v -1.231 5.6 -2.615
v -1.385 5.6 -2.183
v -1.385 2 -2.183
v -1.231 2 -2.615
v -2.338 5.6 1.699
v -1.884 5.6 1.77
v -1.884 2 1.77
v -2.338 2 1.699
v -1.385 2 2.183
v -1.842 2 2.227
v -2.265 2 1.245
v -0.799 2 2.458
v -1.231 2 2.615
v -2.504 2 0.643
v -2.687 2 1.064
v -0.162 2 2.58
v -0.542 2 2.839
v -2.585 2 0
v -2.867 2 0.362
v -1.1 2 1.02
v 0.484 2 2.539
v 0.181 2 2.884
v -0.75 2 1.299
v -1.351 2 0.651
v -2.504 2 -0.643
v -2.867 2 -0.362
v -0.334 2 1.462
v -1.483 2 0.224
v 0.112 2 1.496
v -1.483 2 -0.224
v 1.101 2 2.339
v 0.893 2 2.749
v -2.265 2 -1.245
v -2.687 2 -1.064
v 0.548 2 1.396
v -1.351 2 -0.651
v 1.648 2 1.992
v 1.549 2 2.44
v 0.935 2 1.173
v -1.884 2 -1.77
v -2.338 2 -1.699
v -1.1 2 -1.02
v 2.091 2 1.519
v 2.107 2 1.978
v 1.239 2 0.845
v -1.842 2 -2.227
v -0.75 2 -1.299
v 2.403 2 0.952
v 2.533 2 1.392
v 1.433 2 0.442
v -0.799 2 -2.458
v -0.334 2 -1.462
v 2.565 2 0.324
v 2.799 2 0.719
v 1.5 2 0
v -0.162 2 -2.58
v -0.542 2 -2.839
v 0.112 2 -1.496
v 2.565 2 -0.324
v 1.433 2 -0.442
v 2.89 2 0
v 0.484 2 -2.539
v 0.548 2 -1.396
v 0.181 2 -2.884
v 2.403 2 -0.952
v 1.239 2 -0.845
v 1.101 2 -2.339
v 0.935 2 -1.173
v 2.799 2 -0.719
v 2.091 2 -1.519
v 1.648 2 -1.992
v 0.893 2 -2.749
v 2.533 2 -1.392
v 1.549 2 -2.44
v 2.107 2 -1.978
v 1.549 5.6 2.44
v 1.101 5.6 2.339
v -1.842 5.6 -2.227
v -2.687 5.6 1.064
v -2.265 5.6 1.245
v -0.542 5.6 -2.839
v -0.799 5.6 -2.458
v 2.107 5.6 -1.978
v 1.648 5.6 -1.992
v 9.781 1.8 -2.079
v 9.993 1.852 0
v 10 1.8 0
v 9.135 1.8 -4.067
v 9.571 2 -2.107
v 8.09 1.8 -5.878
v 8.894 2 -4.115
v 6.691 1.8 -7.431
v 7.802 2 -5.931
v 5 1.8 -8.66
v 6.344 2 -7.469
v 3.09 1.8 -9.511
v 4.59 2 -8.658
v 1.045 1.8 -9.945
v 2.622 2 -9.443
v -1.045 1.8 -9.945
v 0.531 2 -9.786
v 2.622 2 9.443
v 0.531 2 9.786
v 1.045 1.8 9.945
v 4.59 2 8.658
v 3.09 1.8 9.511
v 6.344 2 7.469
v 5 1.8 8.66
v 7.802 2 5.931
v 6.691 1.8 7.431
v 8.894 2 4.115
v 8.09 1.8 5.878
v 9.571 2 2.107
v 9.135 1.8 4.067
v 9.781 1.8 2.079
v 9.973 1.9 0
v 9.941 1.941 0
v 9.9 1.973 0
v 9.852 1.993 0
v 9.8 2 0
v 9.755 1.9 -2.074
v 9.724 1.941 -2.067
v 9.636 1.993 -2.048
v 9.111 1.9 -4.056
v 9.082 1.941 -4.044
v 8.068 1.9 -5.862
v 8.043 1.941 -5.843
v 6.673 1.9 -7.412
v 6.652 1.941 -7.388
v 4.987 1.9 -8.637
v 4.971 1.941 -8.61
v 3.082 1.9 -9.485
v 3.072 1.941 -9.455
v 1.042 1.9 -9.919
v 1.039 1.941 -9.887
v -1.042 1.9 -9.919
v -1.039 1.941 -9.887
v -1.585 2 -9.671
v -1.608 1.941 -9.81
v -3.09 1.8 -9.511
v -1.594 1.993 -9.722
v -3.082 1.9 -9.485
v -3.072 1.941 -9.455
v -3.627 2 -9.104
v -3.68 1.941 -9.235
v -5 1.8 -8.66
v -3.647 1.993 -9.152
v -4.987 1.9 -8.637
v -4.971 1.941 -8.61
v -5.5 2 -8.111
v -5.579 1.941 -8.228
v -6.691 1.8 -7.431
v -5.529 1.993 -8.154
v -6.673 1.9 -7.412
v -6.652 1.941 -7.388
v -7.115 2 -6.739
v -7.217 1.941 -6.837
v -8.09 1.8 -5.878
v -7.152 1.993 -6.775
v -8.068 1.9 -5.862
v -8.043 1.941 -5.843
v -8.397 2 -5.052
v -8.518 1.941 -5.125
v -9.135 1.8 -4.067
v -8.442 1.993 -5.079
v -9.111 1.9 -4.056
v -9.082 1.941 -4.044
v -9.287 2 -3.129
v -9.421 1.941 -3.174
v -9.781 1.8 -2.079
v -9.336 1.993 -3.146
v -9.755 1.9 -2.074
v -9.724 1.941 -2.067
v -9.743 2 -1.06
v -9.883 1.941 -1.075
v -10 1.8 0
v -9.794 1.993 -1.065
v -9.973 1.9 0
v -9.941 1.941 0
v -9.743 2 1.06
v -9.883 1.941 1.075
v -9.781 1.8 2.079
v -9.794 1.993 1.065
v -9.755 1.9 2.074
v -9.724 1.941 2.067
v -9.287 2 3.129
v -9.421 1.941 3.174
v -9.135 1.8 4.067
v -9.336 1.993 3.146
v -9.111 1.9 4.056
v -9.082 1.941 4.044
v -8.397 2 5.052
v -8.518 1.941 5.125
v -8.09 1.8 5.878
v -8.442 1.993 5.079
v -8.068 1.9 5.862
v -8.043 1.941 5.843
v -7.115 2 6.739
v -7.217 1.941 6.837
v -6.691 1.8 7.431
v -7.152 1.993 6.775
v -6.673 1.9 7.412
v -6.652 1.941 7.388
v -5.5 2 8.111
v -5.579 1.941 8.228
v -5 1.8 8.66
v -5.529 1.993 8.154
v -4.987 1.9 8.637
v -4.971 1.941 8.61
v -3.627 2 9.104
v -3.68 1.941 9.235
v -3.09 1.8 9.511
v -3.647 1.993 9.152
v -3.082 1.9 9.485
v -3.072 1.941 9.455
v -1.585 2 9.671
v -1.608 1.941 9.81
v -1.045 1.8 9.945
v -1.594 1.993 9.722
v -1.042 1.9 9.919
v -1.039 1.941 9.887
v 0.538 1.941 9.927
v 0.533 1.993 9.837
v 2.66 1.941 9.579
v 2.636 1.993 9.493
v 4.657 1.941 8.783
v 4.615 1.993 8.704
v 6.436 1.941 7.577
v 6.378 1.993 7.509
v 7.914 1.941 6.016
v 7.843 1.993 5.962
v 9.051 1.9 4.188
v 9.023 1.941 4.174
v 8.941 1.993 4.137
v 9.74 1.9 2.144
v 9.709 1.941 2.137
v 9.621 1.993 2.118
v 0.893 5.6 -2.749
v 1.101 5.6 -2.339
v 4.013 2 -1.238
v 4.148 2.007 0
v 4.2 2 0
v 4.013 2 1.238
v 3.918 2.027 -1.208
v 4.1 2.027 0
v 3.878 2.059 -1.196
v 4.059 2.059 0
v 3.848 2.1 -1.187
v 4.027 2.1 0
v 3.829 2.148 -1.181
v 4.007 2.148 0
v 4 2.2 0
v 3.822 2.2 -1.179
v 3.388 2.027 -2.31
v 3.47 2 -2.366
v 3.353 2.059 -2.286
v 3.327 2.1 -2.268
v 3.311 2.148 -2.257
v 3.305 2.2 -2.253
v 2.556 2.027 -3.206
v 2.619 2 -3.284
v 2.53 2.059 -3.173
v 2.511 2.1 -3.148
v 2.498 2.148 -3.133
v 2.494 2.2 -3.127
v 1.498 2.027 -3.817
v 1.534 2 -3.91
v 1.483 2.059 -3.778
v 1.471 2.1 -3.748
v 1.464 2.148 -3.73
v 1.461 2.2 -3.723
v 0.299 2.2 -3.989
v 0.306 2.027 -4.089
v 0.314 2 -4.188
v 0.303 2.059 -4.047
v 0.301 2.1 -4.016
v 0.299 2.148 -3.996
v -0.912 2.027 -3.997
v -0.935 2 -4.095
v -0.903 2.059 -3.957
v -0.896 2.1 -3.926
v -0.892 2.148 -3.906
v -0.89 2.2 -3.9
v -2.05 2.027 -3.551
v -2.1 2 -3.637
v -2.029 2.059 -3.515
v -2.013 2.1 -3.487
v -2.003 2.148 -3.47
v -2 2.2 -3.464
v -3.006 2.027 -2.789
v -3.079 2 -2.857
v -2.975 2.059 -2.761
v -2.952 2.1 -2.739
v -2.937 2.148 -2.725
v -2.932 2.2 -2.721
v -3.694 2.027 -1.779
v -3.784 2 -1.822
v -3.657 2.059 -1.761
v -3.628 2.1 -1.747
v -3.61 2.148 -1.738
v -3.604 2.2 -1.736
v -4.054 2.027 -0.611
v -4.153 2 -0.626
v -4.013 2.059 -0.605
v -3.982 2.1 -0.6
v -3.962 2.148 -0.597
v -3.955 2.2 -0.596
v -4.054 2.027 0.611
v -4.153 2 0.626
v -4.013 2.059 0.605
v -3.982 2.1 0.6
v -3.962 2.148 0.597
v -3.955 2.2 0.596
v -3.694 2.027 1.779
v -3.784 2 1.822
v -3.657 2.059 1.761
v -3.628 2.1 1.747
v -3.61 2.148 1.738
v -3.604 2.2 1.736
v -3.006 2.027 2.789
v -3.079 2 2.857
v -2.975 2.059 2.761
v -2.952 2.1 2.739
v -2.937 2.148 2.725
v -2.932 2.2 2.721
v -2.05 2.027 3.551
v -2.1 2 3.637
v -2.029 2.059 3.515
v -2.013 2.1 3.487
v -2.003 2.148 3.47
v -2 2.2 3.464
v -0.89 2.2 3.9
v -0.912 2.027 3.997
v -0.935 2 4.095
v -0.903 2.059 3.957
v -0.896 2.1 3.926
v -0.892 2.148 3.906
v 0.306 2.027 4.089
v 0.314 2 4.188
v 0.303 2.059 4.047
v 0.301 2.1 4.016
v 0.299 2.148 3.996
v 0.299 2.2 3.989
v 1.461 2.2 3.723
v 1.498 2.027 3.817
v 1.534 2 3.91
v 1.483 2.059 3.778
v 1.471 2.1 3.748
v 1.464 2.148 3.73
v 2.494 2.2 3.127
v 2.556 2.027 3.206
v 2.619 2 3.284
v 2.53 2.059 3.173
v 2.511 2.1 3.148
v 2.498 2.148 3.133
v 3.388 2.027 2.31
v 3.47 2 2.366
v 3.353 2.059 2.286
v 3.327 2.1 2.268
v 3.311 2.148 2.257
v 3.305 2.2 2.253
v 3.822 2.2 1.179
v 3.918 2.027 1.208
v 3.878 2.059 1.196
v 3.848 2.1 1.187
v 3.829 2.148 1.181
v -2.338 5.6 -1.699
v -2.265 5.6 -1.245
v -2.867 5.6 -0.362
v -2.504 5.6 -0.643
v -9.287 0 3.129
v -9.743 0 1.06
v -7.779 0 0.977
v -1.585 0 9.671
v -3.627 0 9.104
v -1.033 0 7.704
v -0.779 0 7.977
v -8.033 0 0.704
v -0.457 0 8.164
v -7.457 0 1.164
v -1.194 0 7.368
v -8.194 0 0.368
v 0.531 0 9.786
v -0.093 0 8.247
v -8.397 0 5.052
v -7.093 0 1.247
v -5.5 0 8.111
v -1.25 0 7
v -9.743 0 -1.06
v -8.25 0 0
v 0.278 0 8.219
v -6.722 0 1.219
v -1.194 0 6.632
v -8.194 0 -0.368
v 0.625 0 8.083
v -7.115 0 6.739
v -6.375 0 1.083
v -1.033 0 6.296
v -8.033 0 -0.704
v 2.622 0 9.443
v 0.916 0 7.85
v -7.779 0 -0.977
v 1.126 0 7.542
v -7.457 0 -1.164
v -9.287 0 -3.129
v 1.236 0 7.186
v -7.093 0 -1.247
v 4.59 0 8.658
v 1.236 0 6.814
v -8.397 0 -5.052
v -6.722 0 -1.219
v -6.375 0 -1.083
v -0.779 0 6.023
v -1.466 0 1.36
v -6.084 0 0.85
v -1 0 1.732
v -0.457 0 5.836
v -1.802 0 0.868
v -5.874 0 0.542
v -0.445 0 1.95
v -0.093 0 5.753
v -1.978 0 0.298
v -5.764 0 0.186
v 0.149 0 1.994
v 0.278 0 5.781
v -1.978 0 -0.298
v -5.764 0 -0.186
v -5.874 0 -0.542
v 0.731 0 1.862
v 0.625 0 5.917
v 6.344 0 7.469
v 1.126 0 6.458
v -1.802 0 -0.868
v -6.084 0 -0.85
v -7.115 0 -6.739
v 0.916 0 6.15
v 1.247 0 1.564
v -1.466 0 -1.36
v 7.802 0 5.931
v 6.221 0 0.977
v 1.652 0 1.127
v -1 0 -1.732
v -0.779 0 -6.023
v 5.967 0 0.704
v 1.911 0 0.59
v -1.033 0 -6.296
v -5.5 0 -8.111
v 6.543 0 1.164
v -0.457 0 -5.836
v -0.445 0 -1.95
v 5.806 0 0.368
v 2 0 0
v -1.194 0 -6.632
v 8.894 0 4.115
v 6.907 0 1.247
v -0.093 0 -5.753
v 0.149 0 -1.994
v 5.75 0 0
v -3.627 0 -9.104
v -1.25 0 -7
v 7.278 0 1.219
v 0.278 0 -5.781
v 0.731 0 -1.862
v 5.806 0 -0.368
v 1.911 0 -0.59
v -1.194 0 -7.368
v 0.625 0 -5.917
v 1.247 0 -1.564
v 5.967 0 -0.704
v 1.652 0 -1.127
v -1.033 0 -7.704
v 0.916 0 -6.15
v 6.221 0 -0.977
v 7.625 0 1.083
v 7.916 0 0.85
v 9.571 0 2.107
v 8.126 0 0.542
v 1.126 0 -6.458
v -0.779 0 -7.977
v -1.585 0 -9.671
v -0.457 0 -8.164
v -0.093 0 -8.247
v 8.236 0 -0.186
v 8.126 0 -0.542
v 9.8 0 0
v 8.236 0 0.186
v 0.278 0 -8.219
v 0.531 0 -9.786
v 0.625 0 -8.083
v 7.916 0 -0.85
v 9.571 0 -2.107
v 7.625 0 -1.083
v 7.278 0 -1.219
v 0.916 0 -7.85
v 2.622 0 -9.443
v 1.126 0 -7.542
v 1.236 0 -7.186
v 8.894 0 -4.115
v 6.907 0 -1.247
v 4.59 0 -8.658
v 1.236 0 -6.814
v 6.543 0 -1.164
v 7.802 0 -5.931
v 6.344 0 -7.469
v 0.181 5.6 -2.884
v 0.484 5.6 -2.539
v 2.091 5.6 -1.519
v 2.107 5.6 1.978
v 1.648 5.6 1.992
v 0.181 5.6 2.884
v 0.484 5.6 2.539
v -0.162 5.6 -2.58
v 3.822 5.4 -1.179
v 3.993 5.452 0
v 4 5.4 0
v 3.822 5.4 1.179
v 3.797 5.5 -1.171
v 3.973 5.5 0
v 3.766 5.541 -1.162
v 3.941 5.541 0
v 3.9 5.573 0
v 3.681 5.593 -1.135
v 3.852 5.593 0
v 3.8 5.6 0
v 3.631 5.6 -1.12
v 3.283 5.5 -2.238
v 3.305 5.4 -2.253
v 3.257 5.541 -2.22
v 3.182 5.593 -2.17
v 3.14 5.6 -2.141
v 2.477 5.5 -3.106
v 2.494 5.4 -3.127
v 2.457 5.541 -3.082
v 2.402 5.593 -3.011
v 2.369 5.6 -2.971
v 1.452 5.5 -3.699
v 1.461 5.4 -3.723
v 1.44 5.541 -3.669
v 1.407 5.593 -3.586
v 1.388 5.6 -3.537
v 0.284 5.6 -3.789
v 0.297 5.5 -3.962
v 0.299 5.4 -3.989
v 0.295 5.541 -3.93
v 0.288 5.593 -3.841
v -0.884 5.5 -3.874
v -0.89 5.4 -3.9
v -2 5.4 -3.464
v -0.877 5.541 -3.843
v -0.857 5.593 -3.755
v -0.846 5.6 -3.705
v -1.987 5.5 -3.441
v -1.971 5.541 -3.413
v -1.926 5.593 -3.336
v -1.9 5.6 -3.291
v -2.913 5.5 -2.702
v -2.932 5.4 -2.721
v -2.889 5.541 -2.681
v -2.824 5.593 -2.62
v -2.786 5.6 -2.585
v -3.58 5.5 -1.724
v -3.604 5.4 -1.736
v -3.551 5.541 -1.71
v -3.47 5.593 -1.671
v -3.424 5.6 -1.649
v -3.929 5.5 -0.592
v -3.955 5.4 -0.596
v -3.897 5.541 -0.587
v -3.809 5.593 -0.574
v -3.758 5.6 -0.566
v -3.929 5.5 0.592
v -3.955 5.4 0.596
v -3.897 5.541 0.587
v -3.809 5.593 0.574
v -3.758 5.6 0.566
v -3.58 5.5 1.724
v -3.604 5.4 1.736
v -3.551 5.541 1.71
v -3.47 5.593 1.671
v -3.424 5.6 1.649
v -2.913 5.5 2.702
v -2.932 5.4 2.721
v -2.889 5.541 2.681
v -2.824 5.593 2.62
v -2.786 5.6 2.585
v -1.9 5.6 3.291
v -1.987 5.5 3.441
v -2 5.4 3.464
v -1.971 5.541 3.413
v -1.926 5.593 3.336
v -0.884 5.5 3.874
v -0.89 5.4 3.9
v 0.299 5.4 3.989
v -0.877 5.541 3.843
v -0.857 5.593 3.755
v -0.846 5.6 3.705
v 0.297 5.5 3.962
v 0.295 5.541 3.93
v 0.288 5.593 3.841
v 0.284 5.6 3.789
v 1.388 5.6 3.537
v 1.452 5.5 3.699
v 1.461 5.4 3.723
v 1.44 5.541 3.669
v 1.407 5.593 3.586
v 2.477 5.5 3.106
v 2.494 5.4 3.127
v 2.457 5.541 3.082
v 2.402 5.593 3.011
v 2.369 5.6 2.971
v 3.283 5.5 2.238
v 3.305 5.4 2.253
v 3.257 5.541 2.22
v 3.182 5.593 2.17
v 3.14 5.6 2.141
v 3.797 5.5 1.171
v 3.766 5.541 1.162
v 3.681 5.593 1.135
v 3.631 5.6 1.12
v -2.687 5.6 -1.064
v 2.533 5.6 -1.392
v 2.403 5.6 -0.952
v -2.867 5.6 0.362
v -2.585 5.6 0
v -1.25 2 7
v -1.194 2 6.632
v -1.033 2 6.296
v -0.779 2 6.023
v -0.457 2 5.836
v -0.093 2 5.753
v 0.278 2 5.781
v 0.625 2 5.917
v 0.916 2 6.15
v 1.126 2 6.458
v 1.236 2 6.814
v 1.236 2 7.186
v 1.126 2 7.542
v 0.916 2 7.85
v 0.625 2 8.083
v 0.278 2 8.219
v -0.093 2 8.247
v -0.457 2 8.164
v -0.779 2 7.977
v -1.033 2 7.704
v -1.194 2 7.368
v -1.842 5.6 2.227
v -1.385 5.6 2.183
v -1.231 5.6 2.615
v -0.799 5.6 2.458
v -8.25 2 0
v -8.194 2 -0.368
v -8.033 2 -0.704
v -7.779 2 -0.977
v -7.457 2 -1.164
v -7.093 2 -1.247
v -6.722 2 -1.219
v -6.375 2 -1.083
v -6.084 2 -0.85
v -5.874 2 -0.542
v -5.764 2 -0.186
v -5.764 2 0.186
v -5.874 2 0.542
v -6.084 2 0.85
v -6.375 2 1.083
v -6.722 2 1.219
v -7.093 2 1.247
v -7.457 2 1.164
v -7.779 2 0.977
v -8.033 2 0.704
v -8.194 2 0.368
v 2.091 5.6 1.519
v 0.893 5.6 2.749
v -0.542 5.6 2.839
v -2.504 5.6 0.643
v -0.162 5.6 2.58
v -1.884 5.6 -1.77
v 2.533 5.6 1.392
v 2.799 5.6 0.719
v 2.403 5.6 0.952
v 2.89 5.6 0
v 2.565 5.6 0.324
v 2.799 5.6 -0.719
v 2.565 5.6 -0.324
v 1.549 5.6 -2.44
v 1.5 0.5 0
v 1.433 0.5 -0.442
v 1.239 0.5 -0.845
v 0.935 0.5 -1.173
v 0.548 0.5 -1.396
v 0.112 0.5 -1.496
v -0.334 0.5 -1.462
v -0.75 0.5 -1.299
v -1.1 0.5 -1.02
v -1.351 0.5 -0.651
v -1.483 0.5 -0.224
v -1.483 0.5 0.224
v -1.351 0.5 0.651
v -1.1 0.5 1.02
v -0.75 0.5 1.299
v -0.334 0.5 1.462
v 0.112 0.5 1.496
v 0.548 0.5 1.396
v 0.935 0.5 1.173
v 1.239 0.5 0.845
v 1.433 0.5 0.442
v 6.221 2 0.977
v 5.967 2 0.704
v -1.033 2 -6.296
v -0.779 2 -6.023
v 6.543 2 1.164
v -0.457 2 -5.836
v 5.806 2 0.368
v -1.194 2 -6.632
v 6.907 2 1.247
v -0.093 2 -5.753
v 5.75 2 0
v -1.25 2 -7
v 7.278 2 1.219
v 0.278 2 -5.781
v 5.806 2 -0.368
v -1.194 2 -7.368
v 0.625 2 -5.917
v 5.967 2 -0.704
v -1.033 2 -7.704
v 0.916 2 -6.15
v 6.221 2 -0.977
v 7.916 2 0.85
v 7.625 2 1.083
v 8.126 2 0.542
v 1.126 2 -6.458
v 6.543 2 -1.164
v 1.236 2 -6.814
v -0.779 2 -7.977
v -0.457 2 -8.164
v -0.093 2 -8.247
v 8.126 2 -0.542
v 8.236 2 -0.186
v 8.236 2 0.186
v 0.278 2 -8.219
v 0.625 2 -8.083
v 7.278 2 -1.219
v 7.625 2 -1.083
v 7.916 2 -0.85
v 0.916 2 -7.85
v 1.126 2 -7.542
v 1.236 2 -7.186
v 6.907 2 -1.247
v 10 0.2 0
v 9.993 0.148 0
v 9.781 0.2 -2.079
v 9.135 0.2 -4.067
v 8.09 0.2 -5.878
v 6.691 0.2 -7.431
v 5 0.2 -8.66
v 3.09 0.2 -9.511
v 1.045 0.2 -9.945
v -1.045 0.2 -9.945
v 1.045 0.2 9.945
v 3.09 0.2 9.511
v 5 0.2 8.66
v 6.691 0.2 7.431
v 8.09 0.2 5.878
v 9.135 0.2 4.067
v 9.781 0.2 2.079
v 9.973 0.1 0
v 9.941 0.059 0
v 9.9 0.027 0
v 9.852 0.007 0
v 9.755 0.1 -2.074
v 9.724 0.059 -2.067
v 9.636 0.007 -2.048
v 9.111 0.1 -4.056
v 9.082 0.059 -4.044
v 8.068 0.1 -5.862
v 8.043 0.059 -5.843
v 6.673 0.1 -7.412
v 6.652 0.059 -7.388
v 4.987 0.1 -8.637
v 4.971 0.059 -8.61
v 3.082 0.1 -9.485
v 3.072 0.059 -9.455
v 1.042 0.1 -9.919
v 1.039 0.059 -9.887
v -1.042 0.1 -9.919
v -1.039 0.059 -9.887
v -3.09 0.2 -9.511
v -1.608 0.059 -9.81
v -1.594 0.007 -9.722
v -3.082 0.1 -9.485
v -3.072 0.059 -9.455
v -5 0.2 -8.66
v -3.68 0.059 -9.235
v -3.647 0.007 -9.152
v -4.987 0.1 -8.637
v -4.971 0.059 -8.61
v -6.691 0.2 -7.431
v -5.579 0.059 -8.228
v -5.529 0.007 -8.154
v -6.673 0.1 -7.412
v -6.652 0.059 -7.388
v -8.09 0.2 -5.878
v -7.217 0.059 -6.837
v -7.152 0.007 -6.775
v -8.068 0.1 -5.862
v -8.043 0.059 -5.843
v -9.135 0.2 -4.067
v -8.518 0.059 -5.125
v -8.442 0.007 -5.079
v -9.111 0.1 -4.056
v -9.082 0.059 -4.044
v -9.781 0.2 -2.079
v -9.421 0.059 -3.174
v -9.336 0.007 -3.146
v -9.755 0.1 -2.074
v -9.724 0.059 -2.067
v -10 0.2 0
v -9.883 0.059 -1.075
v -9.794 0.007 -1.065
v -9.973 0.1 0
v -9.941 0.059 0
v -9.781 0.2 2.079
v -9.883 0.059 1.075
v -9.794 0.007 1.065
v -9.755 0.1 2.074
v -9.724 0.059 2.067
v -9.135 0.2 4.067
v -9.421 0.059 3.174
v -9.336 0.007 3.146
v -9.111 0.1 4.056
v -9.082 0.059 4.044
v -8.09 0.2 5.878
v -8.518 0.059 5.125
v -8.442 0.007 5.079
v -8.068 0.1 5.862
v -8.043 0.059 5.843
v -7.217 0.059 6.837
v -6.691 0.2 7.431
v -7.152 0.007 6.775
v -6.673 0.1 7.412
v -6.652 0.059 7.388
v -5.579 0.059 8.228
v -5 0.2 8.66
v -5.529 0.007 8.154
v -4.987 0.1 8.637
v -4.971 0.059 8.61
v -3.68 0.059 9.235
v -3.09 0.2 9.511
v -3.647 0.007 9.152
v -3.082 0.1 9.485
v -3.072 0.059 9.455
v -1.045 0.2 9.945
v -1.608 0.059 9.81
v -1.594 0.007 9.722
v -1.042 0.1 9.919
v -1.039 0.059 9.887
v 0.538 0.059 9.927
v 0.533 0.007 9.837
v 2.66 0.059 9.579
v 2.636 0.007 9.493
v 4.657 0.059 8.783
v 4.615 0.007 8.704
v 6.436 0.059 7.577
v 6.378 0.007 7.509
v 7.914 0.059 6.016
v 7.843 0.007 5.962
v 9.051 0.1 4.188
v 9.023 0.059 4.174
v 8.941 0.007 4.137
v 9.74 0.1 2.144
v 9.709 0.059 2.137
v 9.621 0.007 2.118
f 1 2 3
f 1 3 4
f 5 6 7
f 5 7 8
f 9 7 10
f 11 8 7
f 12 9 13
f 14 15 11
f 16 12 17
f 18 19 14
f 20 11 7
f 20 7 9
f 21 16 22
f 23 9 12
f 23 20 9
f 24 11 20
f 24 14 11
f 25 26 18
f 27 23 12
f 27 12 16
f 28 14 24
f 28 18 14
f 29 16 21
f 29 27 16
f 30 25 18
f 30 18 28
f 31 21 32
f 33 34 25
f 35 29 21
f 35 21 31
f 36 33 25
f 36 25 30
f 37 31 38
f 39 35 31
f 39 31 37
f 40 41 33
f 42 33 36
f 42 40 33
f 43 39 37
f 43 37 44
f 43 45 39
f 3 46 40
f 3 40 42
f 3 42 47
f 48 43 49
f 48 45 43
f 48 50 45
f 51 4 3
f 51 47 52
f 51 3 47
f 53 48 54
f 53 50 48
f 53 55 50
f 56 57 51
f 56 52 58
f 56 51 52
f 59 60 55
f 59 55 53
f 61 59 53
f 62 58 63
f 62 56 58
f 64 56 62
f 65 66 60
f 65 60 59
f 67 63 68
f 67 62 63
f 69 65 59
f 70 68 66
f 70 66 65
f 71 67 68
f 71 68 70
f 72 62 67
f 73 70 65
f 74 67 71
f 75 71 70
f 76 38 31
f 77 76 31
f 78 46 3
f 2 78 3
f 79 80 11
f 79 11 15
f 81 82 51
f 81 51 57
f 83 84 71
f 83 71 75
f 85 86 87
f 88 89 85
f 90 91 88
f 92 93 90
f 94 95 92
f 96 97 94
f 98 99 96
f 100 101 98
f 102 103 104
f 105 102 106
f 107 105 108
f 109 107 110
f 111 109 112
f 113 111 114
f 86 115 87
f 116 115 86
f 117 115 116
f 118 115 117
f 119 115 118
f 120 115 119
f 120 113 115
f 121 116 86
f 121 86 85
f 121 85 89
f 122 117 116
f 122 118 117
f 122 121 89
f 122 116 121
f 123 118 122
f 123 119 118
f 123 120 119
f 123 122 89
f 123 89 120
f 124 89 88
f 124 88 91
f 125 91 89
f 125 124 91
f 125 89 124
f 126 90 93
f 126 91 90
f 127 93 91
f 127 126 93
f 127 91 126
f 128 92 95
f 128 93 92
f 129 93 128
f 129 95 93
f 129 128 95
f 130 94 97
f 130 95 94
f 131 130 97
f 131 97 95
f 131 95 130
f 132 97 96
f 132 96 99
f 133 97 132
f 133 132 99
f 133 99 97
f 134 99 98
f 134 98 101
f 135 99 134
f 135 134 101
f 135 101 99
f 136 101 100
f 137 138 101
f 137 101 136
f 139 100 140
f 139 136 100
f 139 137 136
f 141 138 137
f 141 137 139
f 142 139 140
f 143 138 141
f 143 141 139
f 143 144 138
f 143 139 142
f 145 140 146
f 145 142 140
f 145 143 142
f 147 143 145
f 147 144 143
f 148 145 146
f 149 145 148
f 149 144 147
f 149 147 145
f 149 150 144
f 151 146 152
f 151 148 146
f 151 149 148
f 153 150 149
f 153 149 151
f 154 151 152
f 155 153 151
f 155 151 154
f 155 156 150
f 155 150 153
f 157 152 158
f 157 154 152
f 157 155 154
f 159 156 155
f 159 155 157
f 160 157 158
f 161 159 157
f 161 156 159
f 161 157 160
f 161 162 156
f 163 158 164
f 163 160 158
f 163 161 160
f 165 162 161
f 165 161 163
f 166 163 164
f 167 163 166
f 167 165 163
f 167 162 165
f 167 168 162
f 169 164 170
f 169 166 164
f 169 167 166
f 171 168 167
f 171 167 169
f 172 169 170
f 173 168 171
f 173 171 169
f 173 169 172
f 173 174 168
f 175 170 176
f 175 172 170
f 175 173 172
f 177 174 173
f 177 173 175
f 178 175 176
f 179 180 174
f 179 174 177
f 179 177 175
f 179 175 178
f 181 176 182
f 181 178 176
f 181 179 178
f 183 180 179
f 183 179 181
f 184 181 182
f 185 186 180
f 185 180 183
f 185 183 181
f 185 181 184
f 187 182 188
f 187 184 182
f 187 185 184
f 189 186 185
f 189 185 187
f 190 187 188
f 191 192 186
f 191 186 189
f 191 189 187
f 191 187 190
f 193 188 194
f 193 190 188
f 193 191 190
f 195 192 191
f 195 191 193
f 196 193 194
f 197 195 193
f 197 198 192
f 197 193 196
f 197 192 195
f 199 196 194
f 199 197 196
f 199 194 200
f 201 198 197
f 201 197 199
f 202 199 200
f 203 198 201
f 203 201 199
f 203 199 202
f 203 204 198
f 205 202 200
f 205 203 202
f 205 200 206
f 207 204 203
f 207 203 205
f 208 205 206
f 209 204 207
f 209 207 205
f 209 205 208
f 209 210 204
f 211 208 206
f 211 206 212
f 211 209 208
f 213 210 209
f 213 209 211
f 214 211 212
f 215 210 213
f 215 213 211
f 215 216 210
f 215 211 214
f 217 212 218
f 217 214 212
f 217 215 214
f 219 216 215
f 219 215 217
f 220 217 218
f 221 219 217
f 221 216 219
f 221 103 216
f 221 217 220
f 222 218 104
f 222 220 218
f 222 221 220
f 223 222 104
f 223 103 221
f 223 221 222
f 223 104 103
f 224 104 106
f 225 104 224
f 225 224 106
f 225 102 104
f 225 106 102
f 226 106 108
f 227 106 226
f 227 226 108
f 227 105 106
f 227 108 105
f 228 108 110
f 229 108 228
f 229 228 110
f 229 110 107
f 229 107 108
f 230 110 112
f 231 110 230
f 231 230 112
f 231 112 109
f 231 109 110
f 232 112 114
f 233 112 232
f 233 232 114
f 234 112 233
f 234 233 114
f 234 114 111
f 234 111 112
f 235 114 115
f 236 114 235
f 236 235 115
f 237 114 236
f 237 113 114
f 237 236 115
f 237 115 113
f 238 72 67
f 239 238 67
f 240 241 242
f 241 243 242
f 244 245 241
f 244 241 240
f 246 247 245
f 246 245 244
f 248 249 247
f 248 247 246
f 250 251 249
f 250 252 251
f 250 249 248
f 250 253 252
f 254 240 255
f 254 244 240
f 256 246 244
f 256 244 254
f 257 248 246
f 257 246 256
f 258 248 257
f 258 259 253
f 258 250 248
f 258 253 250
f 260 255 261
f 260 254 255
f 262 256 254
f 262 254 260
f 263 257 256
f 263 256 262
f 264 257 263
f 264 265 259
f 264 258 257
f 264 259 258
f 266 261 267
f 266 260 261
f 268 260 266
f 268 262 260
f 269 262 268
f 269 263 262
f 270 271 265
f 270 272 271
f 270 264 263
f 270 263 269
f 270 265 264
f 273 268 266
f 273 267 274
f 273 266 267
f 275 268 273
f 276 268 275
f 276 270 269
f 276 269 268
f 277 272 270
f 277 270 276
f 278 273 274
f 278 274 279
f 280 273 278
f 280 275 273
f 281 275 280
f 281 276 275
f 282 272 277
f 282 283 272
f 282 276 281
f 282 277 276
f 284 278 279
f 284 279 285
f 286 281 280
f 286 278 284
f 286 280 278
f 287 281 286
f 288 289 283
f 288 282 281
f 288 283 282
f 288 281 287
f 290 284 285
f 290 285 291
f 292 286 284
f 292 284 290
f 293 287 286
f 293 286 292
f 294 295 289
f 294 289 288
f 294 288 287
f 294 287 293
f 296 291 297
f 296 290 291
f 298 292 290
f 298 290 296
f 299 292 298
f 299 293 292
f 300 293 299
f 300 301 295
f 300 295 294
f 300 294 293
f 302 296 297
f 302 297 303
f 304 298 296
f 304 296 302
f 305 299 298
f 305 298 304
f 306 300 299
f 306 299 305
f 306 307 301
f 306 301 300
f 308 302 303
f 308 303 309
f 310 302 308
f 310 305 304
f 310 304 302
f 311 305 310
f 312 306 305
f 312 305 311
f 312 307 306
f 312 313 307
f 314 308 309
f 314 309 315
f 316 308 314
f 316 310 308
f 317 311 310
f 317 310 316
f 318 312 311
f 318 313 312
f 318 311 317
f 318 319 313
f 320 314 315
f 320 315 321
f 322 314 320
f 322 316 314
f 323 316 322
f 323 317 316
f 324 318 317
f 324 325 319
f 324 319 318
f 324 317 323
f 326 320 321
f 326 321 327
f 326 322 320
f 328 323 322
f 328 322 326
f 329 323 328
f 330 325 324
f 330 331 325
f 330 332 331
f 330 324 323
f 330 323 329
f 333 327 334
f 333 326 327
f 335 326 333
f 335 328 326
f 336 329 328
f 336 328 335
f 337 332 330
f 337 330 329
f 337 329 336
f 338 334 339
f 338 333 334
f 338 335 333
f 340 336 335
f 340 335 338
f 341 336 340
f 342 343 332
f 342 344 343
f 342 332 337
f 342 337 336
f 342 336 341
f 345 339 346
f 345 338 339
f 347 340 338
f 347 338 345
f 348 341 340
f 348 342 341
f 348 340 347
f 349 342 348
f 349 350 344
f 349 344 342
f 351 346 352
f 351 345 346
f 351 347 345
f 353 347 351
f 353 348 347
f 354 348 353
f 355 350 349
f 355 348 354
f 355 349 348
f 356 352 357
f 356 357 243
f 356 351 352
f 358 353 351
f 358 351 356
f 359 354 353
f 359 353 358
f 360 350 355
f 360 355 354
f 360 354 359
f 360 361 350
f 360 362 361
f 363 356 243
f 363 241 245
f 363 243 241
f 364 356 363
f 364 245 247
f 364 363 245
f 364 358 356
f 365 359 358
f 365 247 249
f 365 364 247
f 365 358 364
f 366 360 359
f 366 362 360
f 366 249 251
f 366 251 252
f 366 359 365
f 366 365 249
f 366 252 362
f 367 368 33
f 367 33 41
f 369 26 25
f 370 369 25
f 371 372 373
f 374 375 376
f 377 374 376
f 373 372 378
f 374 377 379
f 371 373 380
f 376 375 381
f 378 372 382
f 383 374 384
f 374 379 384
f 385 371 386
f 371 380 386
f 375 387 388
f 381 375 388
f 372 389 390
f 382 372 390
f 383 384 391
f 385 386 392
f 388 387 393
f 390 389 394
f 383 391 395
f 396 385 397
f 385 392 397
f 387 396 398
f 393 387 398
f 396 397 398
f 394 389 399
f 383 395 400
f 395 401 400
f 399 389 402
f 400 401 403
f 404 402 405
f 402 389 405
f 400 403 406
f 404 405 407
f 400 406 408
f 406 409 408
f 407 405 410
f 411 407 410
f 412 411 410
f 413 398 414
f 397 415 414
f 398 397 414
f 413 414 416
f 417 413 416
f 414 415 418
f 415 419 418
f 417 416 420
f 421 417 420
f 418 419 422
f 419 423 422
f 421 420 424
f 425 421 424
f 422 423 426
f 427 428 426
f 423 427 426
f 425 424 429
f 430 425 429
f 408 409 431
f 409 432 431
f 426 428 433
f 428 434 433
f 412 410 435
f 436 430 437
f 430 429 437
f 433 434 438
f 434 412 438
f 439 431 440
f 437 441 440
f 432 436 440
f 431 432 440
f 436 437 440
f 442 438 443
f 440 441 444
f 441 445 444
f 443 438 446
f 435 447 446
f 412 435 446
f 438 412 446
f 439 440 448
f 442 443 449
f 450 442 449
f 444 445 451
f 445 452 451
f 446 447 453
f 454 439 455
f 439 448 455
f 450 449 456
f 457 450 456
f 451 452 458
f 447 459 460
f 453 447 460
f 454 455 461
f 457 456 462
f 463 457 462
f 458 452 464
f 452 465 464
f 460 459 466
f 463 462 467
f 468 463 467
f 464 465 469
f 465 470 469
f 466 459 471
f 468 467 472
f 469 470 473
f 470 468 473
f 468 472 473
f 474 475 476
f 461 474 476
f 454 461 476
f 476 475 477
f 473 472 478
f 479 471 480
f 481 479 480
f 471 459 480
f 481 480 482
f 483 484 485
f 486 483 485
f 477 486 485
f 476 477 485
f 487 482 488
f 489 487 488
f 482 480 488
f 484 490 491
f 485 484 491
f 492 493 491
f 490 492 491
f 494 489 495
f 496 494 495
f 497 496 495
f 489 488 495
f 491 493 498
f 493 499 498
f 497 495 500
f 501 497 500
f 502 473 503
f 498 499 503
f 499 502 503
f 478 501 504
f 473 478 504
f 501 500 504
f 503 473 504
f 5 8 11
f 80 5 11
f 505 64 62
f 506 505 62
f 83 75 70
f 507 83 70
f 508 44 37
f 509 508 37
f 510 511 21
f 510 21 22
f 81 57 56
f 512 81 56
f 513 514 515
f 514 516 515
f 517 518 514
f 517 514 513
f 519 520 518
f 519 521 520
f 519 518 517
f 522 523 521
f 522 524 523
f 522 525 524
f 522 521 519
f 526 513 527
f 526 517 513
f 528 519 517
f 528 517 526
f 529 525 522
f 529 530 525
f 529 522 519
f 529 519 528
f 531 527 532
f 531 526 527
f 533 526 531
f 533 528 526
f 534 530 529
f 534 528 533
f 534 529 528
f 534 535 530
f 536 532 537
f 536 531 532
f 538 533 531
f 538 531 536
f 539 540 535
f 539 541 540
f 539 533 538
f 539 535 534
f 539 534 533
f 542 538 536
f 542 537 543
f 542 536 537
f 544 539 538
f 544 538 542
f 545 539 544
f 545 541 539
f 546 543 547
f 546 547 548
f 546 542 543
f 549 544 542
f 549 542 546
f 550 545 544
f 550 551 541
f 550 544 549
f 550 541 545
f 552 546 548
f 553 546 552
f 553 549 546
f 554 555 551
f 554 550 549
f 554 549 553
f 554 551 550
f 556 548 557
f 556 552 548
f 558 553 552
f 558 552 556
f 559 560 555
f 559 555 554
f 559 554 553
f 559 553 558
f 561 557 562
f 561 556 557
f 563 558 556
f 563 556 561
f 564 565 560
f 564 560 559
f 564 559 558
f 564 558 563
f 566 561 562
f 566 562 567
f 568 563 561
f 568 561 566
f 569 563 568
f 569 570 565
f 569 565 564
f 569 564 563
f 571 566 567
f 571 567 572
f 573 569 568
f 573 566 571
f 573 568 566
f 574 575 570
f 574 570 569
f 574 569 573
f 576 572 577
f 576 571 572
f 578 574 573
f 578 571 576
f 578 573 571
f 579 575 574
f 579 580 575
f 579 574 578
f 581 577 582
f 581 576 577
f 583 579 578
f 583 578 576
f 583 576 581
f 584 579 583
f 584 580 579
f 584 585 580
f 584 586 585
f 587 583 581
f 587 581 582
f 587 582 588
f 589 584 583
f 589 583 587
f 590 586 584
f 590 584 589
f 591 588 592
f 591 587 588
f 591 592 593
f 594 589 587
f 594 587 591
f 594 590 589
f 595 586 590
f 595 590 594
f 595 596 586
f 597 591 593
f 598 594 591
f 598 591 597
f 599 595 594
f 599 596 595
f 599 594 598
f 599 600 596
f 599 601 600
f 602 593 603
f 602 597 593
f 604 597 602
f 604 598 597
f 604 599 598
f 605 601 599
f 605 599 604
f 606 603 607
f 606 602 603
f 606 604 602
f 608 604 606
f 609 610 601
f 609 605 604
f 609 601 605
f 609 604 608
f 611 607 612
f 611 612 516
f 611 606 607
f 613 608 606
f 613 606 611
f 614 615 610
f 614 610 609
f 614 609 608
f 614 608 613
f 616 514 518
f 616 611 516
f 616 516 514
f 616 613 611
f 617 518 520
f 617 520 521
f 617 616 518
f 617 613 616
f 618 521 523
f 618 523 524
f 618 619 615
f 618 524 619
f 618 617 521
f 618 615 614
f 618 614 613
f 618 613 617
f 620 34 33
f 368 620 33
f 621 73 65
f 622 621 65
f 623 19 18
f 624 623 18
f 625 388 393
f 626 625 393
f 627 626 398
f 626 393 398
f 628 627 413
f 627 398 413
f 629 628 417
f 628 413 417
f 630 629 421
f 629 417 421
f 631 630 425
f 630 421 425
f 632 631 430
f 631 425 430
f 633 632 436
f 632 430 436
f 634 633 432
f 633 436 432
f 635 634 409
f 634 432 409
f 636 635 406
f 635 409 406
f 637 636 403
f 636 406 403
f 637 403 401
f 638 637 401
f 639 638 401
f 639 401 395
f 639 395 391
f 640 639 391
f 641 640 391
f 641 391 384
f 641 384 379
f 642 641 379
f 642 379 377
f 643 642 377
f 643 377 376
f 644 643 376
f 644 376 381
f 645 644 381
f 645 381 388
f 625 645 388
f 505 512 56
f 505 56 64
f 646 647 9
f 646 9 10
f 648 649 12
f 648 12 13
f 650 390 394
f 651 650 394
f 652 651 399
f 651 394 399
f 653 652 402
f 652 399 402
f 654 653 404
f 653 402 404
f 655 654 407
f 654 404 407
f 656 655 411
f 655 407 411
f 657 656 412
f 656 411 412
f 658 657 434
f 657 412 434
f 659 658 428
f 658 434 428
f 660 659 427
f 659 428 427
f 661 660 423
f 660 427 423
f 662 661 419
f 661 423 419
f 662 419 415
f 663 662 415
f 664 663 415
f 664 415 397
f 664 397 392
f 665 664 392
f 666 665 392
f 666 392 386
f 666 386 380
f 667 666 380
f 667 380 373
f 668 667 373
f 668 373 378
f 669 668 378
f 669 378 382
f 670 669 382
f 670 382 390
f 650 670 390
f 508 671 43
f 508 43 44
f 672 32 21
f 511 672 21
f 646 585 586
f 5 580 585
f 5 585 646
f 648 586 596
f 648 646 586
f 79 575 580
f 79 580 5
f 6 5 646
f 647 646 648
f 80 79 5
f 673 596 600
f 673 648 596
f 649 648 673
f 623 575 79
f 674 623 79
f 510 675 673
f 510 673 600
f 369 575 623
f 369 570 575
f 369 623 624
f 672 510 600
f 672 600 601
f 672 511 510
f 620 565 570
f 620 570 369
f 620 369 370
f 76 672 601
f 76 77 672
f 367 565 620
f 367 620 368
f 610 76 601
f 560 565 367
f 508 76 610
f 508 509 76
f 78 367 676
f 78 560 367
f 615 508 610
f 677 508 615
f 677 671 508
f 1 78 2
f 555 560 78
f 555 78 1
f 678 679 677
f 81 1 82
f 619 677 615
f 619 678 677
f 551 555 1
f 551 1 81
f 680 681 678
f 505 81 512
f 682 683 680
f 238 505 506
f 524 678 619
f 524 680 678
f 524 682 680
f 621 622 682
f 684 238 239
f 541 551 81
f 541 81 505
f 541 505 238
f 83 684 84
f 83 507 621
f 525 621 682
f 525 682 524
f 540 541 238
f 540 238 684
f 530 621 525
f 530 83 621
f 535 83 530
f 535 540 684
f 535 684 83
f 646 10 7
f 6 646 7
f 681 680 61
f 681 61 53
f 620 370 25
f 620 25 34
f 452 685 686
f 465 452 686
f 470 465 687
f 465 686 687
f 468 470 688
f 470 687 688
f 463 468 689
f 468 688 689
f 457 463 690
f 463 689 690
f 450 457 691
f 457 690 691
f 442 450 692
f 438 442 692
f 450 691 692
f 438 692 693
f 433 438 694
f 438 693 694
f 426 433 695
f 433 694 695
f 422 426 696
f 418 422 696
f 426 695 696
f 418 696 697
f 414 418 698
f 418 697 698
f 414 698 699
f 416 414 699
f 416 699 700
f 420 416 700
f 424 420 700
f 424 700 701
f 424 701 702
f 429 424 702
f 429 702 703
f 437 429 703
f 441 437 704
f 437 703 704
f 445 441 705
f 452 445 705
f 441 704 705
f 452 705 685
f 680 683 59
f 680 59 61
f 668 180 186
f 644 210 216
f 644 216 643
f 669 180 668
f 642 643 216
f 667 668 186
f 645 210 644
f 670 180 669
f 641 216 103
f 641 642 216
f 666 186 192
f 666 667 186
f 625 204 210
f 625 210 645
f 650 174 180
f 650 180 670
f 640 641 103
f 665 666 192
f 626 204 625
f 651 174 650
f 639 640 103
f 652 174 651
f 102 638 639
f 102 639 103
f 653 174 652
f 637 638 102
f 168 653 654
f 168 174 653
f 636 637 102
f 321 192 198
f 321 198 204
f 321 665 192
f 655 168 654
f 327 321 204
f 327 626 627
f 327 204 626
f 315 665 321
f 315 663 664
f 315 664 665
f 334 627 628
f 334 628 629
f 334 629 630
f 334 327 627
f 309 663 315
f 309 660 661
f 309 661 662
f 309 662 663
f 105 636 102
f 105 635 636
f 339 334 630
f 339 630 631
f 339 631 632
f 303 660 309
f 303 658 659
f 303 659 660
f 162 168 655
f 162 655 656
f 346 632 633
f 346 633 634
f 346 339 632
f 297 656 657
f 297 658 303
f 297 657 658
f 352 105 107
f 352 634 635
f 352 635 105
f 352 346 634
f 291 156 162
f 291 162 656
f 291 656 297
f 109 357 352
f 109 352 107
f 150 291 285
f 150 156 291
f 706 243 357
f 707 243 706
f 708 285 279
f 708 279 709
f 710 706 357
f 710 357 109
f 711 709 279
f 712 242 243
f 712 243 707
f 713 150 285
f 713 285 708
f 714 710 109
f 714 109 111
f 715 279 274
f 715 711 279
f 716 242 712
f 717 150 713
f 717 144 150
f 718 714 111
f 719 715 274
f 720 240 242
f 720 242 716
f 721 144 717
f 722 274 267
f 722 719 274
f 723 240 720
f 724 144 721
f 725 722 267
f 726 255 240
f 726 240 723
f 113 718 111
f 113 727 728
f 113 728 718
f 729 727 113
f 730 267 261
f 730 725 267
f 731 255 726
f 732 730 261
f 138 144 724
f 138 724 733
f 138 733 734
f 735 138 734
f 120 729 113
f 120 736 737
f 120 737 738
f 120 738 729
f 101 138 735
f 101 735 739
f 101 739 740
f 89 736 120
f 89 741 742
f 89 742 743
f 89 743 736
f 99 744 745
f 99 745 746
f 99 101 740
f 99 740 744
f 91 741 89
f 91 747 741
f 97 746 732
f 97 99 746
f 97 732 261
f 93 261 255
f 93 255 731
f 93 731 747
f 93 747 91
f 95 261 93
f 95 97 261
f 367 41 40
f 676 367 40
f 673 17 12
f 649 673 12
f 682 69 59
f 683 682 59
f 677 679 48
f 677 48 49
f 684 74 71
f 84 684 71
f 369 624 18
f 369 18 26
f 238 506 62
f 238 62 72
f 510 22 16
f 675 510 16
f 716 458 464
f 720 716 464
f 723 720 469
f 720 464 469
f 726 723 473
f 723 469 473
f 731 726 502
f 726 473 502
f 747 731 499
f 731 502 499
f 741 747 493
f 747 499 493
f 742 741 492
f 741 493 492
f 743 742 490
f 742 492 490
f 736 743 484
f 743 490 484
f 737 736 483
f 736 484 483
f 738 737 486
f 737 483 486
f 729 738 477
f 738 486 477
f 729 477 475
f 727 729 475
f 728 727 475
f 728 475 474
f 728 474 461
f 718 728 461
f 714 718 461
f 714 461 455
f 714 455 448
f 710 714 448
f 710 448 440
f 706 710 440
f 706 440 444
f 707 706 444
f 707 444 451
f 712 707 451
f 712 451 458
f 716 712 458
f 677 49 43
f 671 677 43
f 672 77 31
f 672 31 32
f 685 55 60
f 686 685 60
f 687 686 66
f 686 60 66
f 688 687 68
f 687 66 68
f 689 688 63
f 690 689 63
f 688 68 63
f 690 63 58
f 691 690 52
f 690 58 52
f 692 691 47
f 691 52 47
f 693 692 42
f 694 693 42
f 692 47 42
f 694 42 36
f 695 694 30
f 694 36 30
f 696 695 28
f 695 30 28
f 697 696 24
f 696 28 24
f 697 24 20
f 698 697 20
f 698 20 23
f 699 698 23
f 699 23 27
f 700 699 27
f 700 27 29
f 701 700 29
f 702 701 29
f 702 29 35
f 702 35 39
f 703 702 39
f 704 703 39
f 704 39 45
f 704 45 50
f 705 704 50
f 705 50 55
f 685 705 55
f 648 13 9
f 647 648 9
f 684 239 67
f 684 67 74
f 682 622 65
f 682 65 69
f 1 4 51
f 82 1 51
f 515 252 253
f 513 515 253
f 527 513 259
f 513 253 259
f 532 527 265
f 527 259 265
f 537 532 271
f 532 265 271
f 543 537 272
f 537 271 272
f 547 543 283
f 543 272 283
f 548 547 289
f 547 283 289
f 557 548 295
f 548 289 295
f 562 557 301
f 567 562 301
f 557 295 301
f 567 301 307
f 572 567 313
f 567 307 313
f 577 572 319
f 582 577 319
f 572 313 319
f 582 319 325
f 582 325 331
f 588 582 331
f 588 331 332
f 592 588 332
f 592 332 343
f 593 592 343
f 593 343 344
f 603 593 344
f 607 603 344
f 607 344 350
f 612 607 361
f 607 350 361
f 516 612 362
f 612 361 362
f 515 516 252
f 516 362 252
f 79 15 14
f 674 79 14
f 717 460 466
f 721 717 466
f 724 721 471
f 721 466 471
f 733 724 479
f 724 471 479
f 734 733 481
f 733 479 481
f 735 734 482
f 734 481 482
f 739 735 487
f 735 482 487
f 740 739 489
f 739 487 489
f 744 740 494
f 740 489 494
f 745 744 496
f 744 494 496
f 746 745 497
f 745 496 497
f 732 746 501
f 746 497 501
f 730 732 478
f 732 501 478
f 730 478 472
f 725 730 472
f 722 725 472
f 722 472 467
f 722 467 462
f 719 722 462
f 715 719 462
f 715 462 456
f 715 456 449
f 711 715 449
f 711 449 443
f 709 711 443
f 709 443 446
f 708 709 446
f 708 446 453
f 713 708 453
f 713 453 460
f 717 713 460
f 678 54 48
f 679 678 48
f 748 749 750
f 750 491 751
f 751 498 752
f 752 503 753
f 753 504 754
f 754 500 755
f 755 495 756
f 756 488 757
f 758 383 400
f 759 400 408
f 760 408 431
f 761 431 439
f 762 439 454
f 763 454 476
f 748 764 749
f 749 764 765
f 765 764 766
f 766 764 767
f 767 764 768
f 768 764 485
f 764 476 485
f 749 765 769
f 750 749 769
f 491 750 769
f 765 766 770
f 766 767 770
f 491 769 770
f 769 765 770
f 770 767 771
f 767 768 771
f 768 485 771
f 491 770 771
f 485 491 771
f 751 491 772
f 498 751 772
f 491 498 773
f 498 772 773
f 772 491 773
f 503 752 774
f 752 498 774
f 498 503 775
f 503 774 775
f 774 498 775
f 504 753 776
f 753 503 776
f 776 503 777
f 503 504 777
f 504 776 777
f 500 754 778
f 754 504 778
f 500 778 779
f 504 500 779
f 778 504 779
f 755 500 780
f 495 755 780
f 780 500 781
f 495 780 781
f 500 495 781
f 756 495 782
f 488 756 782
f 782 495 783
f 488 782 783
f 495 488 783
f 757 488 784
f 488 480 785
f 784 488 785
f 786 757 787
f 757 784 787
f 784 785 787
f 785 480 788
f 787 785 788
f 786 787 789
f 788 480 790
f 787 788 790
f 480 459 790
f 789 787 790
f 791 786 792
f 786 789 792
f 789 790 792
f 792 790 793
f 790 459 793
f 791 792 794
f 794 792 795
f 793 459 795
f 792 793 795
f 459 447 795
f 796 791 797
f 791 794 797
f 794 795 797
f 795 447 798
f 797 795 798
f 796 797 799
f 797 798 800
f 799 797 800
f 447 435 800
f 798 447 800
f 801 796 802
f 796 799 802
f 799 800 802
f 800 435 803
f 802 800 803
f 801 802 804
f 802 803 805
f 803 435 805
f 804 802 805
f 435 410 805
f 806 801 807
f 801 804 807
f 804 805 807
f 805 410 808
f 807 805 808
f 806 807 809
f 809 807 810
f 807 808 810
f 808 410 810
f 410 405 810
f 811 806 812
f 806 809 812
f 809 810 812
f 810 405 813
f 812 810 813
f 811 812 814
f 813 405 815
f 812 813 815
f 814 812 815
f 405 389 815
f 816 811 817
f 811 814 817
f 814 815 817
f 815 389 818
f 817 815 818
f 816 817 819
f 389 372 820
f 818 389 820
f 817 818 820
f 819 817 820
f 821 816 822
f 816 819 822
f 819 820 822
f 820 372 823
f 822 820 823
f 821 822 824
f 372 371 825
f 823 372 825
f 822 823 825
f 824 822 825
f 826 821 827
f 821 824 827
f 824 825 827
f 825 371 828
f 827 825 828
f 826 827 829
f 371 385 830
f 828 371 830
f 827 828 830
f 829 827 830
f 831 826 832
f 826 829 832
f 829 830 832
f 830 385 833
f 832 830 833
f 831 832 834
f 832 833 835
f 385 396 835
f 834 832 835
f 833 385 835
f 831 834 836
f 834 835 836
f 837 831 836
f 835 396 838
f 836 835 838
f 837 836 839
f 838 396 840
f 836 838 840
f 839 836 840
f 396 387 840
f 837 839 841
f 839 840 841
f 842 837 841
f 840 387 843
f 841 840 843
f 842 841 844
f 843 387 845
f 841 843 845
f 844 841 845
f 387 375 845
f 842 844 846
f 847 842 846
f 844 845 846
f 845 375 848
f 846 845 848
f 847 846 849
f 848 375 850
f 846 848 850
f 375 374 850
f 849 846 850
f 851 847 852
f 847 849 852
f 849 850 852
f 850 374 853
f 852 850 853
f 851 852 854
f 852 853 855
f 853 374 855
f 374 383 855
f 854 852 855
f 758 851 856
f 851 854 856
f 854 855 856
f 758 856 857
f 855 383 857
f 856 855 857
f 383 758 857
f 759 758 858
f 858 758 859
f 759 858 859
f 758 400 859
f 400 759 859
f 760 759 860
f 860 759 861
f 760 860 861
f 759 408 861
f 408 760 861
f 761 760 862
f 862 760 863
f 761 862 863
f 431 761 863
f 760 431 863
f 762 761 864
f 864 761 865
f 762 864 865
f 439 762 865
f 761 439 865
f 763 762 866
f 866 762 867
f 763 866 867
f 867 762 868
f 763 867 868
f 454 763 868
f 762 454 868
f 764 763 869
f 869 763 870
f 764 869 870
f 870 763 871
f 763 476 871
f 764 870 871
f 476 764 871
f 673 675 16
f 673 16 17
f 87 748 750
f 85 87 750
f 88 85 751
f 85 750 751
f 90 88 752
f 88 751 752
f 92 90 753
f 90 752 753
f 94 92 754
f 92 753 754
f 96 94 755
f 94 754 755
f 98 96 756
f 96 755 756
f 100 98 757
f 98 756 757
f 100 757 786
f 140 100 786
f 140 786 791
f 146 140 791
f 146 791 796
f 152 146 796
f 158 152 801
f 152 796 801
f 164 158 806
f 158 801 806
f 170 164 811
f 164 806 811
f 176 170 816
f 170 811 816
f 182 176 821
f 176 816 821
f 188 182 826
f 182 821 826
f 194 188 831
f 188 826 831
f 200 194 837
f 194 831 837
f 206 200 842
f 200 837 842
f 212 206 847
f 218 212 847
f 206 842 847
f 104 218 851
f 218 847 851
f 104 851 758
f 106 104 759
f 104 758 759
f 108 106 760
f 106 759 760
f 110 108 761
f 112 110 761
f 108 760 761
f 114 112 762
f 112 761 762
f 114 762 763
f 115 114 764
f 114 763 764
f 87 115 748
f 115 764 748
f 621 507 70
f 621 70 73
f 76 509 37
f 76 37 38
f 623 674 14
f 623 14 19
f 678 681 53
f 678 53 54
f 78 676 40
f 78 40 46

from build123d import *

# Parameters (mm, degrees)
SKETCH2_R             = 10
BOSS_EXTRUDE1_DEPTH   = 2
SKETCH3_R             = 4
BOSS_EXTRUDE2_DEPTH   = 3.6
M3X0_5_TAPPED_HOLE1_D = 2.5
SKETCH6_R             = 2.585
CUT_EXTRUDE1_DEPTH    = 3.6
SKETCH7_R             = 1.5
CUT_EXTRUDE2_DEPTH    = 3
FILLET1_R             = 0.2
CUT_EXTRUDE6_DEPTH    = 3.6
CIRPATTERN1_COUNT     = 25
CHAMFER1_SIZE         = 0.5


with BuildPart() as part:
    # Sketch2 → Boss-Extrude1 (new body)
    with BuildSketch(Plane(origin=(0, 0, 0), x_dir=(1, 0, 0), z_dir=(0, 1, 0))):
        Circle(SKETCH2_R)
    extrude(amount=BOSS_EXTRUDE1_DEPTH)

    # Sketch3 → Boss-Extrude2 (add)
    with BuildSketch(Plane(origin=(0, 2, 0), x_dir=(1, 0, 0), z_dir=(0, 1, 0))):
        Circle(SKETCH3_R)
    extrude(amount=BOSS_EXTRUDE2_DEPTH)

    # M3x0.5 Tapped Hole1 (through all)
    with Locations(Plane(origin=(0, 2, 0), x_dir=(1, 0, 0), z_dir=(0, 1, 0))):
        with Locations((0, 7), (-7, 0), (0, -7), (7, 0)):
            Hole(M3X0_5_TAPPED_HOLE1_D / 2)

    # Sketch6 → Cut-Extrude1 (cut)
    with BuildSketch(Plane(origin=(0, 5.6, 0), x_dir=(1, 0, 0), z_dir=(0, 1, 0))):
        Circle(SKETCH6_R)
    extrude(amount=-CUT_EXTRUDE1_DEPTH, mode=Mode.SUBTRACT)

    # Sketch7 → Cut-Extrude2 (cut, through all)
    with BuildSketch(Plane(origin=(0, 2, 0), x_dir=(1, 0, 0), z_dir=(0, 1, 0))):
        Circle(SKETCH7_R)
    extrude(amount=-CUT_EXTRUDE2_DEPTH, mode=Mode.SUBTRACT)

    # Fillet1
    fillet1_edges = [part.edges().sort_by_distance(p)[0] for p in [
        (-10, 0, 0),
        (-10, 2, 0),
        (-4, 2, 0),
        (-4, 5.6, 0),
    ]]
    fillet(fillet1_edges, radius=FILLET1_R)

    # Sketch8 → Cut-Extrude6 (cut)
    with BuildSketch(Plane(origin=(0, 5.6, 0), x_dir=(1, 0, 0), z_dir=(0, 1, 0))):
        with BuildLine():
            Line((2.564616503, 0.323986409), (2.89, 0))
            Line((2.89, 0), (2.564616503, -0.323986409))
            ThreePointArc((2.564616503, -0.323986409), (2.585, 0), (2.564616503, 0.323986409))
        make_face()
    cut_extrude6 = extrude(amount=-CUT_EXTRUDE6_DEPTH, mode=Mode.SUBTRACT)

    # CirPattern1: Cut-Extrude6 ×25 about axis
    cirpattern1_axis = Axis((0, 0, 0), (0, 1, 0))
    for i in range(1, CIRPATTERN1_COUNT):
        add(cut_extrude6.rotate(cirpattern1_axis, i * 360 / CIRPATTERN1_COUNT), mode=Mode.SUBTRACT)

    # Chamfer1
    chamfer1_edges = [part.edges().sort_by_distance(p)[0] for p in [
        (-1.5, 0, 0),
    ]]
    chamfer(chamfer1_edges, length=CHAMFER1_SIZE)


solid = part.part
